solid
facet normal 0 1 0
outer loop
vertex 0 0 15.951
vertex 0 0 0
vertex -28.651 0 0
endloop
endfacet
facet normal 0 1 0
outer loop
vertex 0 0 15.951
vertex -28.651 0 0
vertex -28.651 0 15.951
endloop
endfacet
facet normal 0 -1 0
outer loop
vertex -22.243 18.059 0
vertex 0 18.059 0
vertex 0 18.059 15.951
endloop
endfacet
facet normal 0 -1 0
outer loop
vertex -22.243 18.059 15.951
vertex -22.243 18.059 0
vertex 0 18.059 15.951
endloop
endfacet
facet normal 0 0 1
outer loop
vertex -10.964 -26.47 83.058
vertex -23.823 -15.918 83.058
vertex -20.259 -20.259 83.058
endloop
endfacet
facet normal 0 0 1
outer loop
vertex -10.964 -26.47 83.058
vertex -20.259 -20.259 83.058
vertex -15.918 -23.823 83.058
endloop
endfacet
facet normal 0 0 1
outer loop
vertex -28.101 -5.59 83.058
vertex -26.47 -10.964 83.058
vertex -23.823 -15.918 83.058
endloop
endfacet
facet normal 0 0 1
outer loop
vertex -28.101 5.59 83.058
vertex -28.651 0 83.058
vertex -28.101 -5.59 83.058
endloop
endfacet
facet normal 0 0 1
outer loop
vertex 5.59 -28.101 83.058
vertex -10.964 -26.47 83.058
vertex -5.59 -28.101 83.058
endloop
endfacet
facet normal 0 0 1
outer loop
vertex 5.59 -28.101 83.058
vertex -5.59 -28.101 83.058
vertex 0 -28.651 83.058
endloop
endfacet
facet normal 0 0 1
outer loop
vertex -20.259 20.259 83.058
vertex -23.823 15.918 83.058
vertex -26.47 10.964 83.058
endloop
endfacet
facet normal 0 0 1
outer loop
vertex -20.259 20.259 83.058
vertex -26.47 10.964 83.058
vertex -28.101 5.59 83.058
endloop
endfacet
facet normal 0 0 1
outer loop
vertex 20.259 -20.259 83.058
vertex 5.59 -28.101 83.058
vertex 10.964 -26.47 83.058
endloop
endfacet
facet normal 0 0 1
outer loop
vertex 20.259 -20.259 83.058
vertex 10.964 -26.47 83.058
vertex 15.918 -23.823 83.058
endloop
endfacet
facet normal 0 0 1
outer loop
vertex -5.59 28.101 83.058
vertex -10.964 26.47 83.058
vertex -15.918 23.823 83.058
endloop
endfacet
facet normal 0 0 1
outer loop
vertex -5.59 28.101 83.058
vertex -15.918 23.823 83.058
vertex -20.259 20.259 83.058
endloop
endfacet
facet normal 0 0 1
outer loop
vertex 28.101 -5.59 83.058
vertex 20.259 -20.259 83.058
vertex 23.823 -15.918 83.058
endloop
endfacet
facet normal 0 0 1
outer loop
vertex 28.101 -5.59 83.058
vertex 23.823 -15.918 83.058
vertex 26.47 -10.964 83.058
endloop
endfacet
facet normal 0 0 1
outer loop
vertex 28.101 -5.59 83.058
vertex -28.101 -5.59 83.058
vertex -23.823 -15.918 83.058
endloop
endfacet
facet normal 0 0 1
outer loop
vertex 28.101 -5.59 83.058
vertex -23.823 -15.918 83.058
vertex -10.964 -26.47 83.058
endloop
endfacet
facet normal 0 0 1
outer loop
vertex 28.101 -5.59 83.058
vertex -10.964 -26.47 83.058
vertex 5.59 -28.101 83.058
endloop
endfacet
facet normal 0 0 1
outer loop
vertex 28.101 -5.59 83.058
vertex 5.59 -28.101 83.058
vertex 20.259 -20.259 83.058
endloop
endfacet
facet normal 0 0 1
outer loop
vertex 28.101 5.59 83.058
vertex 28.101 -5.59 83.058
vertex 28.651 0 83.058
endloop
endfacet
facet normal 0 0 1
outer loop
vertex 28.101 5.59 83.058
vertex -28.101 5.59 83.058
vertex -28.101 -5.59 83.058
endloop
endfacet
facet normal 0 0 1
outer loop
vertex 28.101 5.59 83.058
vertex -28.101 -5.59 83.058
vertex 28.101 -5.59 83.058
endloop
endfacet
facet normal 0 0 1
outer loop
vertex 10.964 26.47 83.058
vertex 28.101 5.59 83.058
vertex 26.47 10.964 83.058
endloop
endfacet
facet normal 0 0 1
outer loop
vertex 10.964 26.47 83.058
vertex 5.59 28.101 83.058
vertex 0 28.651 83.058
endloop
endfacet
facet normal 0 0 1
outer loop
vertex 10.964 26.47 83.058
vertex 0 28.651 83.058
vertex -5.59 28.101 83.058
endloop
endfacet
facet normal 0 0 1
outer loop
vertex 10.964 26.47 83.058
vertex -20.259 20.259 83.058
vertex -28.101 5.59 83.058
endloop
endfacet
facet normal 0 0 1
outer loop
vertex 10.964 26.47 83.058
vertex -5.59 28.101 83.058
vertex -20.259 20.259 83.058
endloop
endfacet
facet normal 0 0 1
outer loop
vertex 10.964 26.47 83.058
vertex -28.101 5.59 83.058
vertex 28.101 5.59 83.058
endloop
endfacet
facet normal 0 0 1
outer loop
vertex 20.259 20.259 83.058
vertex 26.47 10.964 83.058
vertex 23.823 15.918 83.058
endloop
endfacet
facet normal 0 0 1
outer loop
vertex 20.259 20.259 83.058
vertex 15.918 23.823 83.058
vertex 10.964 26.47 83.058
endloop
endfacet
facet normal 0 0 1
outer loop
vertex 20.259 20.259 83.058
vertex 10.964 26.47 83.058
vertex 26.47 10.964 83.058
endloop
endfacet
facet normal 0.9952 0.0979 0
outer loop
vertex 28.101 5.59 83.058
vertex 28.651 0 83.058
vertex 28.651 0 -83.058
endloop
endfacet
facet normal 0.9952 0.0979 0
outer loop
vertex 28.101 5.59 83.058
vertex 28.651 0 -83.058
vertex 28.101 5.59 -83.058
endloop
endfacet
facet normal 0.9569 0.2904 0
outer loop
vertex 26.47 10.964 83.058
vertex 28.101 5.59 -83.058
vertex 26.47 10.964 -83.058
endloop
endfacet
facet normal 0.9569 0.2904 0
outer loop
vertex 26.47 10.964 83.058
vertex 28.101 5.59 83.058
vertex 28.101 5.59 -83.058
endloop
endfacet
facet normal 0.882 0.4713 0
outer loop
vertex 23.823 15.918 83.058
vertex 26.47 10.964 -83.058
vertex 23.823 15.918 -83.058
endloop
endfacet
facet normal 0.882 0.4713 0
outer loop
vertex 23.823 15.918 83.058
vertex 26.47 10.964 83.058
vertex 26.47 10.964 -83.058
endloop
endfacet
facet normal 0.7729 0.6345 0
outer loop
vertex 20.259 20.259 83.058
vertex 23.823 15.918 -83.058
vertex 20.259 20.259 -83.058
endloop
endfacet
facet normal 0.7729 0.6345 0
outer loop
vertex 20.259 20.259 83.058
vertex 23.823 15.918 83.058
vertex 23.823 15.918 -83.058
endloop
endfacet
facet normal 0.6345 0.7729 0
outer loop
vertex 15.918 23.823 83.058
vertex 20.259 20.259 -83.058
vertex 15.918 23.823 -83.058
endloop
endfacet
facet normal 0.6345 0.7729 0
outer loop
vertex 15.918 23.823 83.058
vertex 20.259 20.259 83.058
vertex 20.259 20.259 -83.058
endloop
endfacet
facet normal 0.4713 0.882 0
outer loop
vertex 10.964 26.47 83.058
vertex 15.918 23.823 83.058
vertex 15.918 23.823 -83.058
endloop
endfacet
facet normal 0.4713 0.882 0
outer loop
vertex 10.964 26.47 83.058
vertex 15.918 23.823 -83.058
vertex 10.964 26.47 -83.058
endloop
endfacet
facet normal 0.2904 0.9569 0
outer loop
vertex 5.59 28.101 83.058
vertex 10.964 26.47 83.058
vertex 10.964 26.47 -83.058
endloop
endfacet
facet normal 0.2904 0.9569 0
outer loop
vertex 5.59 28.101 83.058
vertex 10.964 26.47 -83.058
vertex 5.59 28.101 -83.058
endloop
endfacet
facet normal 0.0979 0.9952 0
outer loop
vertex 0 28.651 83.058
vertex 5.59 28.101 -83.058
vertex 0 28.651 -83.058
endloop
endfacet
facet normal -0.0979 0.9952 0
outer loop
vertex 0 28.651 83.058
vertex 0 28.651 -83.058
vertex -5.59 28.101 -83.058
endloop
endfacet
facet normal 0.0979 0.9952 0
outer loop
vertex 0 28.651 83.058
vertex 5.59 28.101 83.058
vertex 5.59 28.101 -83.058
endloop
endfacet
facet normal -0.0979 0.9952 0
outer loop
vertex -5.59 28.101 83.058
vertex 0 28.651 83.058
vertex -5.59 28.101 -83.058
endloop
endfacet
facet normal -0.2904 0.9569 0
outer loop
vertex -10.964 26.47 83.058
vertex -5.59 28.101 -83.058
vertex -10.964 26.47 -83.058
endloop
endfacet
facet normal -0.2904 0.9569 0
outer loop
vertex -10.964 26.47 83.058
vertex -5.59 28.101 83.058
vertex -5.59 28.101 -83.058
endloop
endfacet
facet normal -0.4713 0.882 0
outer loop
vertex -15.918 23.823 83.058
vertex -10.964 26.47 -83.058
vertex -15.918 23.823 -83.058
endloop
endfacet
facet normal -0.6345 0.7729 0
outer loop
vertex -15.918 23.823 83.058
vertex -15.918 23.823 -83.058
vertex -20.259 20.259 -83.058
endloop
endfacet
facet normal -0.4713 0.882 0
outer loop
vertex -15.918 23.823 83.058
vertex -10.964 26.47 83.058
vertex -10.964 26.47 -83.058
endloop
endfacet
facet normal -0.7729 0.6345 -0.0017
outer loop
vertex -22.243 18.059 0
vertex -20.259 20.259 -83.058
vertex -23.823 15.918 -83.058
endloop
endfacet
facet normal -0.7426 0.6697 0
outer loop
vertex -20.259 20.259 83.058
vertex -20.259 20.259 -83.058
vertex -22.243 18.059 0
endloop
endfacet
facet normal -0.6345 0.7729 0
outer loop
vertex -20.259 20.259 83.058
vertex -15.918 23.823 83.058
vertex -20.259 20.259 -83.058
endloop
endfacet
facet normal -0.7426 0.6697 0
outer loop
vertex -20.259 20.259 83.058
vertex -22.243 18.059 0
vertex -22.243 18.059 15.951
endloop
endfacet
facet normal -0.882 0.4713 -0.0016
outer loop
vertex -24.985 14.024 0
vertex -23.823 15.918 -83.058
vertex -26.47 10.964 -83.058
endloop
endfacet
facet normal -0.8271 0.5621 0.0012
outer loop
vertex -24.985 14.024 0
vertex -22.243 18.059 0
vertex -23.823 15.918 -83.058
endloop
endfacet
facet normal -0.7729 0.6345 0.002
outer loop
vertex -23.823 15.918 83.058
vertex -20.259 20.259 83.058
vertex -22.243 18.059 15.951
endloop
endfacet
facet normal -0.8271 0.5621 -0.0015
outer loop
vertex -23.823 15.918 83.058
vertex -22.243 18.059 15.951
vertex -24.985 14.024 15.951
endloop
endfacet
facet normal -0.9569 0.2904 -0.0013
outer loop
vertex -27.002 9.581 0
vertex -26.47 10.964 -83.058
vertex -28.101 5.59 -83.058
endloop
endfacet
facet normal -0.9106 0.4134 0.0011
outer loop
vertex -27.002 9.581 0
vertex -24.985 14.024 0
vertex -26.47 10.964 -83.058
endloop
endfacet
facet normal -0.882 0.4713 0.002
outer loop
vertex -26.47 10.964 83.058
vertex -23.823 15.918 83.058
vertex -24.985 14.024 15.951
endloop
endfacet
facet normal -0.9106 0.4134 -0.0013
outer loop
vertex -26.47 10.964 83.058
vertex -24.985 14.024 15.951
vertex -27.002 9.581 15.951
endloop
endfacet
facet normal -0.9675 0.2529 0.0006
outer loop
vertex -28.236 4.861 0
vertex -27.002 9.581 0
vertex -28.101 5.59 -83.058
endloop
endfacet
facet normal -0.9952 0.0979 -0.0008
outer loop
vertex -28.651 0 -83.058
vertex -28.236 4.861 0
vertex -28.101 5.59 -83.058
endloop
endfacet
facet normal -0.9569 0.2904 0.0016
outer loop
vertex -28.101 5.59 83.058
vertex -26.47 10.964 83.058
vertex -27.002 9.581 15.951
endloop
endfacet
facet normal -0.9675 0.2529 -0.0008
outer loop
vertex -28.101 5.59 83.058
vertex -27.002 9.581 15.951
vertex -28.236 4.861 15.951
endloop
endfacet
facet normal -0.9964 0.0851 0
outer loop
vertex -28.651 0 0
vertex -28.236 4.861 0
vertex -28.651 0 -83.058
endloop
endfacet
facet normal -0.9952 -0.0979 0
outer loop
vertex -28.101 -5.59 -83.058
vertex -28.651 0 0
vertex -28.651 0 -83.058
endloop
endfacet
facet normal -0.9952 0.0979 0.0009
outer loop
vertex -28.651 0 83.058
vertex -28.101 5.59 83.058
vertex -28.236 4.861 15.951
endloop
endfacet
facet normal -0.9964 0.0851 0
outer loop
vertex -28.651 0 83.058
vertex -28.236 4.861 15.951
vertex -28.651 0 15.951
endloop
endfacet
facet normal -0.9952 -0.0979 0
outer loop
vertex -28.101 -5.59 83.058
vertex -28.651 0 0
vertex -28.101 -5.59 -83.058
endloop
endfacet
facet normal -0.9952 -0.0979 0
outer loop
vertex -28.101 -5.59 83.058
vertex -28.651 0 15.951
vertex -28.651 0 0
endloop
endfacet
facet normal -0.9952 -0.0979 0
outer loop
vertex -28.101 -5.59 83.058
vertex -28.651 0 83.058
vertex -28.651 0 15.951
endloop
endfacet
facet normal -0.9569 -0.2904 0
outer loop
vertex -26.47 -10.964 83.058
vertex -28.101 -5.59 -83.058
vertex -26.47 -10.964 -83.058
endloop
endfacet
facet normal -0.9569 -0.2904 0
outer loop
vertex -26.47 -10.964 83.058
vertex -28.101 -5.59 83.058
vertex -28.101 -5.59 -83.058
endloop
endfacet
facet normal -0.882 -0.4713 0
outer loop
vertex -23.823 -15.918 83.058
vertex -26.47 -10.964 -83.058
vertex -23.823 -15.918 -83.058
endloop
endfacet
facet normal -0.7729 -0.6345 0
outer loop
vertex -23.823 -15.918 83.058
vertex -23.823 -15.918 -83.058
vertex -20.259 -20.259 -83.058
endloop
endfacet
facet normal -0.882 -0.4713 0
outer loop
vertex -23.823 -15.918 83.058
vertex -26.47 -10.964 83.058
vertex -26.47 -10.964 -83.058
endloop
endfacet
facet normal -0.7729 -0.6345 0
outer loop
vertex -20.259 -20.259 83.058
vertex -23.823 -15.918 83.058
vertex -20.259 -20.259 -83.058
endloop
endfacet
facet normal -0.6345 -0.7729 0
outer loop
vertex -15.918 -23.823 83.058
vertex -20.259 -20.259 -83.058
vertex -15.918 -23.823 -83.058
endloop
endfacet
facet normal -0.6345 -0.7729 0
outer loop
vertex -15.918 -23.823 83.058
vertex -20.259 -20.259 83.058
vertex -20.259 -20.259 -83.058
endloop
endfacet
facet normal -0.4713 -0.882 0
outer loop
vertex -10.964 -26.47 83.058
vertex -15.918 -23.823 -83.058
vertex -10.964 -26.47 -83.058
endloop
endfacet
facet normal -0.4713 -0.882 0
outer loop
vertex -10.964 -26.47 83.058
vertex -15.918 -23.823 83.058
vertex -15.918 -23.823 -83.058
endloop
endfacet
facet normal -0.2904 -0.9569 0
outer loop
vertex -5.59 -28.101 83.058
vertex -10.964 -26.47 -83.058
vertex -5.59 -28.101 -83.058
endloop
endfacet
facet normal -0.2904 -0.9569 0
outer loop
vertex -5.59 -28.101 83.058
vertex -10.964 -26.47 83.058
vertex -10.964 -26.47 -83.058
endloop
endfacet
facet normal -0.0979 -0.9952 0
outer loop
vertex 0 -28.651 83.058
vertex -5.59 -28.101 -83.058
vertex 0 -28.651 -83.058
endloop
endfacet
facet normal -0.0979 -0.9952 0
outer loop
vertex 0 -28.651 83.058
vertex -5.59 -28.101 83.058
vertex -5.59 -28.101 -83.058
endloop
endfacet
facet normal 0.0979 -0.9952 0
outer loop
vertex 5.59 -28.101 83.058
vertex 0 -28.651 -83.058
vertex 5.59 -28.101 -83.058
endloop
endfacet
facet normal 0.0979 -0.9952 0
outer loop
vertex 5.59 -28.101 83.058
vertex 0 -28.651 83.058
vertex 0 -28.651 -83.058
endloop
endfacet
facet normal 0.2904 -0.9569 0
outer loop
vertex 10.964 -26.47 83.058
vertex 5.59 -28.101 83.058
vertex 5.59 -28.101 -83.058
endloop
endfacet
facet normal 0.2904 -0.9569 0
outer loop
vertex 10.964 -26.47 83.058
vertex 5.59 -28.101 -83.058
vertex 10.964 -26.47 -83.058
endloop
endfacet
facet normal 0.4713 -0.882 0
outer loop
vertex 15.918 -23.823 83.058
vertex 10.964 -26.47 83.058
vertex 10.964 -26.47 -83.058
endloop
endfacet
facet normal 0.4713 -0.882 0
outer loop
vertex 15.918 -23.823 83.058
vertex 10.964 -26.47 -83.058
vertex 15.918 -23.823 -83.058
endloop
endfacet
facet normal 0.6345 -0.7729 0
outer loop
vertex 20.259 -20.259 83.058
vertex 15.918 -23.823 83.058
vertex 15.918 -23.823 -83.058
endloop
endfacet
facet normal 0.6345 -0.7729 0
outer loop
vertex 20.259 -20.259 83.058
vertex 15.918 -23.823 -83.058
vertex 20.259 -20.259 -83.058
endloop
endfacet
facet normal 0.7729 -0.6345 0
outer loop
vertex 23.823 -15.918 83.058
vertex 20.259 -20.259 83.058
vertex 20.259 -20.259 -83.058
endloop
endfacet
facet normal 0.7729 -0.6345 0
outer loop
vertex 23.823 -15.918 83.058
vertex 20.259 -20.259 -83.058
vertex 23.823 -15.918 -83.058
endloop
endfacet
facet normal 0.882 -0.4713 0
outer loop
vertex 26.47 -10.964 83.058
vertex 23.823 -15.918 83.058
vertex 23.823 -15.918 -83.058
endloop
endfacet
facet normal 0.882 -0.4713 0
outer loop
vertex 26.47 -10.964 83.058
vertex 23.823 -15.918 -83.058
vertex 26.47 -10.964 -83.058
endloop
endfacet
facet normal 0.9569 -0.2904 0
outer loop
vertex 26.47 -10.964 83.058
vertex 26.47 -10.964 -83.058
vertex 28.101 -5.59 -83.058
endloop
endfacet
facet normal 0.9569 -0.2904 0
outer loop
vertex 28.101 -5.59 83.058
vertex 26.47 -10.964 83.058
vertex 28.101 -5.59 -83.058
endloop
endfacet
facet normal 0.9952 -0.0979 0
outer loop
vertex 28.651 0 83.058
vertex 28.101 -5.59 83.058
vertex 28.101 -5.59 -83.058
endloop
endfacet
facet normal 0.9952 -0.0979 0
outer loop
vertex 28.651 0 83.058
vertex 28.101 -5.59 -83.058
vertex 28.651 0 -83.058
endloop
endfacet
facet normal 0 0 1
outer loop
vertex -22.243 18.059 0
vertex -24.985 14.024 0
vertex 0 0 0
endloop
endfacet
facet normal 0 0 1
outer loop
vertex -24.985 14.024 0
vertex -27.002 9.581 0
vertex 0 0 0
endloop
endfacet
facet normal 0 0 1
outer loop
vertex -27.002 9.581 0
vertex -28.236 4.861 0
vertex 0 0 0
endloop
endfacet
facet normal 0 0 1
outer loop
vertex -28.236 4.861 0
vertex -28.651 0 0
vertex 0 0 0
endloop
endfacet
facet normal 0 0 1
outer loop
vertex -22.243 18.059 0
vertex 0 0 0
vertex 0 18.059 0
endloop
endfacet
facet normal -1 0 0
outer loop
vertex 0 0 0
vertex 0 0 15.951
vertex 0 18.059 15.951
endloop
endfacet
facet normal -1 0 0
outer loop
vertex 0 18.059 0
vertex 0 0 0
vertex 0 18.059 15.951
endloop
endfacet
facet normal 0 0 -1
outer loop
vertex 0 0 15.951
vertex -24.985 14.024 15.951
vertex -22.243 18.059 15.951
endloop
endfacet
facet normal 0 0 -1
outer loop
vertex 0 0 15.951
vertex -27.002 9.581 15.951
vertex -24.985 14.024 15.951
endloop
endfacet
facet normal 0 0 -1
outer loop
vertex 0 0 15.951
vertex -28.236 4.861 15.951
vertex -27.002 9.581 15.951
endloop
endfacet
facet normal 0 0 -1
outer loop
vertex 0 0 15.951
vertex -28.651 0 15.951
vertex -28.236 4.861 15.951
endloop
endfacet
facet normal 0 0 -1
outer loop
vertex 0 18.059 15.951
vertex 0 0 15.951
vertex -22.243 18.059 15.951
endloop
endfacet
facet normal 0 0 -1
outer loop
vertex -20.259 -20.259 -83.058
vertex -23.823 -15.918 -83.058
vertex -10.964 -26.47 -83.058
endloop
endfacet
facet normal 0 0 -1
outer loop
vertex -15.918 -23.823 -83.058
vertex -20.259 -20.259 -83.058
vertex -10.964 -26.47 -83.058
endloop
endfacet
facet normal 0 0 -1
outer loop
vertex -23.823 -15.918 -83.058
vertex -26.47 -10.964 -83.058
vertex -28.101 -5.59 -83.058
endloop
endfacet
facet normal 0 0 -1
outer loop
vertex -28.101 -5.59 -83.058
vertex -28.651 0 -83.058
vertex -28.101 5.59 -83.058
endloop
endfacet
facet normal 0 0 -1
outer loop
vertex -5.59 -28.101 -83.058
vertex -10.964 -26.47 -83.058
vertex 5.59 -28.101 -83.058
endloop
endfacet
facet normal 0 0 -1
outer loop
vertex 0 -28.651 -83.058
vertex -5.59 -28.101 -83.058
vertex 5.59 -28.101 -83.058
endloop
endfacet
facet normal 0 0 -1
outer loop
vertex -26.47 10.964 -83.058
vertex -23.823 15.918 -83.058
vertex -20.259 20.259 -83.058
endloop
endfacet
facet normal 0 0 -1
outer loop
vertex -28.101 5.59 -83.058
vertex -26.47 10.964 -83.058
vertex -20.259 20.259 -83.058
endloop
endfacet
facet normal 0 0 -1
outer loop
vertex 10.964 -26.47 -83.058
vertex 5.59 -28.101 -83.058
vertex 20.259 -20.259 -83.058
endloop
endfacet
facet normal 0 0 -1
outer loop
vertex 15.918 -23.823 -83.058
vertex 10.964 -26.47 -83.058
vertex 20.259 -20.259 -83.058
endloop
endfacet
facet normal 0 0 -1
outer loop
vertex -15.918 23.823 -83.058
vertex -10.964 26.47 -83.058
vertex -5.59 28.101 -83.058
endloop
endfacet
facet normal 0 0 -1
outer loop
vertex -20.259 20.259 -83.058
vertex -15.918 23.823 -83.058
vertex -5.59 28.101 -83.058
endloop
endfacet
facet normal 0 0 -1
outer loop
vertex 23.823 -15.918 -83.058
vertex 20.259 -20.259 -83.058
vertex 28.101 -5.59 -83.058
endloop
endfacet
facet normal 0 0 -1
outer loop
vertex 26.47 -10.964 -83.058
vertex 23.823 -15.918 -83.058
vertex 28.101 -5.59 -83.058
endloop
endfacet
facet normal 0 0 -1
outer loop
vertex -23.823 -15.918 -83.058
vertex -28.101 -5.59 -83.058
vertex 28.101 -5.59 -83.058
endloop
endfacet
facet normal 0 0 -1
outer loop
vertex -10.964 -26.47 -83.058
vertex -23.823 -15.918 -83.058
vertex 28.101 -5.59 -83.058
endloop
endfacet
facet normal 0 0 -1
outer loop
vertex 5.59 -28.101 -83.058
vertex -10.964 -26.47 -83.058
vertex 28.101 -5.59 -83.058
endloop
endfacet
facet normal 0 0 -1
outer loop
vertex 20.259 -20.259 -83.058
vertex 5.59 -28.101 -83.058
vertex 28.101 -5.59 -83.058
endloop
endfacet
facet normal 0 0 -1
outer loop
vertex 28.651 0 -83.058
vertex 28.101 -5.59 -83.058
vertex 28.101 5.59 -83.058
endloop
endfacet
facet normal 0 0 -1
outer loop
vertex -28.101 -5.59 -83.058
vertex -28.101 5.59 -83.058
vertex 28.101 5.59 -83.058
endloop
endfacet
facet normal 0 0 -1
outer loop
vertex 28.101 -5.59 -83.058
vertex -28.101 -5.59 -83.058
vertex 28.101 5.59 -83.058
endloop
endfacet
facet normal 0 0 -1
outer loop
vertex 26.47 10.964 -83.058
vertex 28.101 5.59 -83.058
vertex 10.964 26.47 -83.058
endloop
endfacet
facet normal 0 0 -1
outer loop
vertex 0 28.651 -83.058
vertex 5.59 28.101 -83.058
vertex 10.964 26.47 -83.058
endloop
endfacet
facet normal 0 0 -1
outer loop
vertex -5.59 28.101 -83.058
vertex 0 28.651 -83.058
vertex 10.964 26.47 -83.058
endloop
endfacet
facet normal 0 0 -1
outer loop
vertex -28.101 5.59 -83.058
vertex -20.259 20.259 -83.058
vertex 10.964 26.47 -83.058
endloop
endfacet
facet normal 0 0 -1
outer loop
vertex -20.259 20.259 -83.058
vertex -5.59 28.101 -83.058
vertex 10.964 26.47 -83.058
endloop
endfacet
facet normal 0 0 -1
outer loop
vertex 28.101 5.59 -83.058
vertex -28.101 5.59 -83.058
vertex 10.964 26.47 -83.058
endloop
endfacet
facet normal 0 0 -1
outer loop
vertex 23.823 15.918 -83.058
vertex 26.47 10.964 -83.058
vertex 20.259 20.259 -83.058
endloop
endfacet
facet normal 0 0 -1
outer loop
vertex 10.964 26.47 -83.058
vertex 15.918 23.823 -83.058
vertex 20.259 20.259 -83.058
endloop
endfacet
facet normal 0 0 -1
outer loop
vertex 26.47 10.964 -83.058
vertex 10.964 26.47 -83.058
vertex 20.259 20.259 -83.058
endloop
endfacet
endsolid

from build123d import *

# Parameters (mm, degrees)
F0_R     = 28.6512
F1_DEPTH = 83.058
F2_W     = 18.0594
F2_H     = 15.9512
F4_DEPTH = 60.706


# Not quite as in the source:
# - a feature of the source that left no trace in its solid (it failed there, or was rolled back) is left out


with BuildPart() as f1:
    # F0 (on Top) → F1 (new body, symmetric)
    with BuildSketch(Plane.XY):
        Circle(F0_R)
    extrude(amount=F1_DEPTH, both=True)

    # F2 (on Right) → F4 (cut)
    with BuildSketch(Plane.YZ):
        with Locations((9.0297, 7.9756)):
            Rectangle(F2_W, F2_H)
    extrude(amount=-F4_DEPTH, mode=Mode.SUBTRACT)


solid = f1.part
